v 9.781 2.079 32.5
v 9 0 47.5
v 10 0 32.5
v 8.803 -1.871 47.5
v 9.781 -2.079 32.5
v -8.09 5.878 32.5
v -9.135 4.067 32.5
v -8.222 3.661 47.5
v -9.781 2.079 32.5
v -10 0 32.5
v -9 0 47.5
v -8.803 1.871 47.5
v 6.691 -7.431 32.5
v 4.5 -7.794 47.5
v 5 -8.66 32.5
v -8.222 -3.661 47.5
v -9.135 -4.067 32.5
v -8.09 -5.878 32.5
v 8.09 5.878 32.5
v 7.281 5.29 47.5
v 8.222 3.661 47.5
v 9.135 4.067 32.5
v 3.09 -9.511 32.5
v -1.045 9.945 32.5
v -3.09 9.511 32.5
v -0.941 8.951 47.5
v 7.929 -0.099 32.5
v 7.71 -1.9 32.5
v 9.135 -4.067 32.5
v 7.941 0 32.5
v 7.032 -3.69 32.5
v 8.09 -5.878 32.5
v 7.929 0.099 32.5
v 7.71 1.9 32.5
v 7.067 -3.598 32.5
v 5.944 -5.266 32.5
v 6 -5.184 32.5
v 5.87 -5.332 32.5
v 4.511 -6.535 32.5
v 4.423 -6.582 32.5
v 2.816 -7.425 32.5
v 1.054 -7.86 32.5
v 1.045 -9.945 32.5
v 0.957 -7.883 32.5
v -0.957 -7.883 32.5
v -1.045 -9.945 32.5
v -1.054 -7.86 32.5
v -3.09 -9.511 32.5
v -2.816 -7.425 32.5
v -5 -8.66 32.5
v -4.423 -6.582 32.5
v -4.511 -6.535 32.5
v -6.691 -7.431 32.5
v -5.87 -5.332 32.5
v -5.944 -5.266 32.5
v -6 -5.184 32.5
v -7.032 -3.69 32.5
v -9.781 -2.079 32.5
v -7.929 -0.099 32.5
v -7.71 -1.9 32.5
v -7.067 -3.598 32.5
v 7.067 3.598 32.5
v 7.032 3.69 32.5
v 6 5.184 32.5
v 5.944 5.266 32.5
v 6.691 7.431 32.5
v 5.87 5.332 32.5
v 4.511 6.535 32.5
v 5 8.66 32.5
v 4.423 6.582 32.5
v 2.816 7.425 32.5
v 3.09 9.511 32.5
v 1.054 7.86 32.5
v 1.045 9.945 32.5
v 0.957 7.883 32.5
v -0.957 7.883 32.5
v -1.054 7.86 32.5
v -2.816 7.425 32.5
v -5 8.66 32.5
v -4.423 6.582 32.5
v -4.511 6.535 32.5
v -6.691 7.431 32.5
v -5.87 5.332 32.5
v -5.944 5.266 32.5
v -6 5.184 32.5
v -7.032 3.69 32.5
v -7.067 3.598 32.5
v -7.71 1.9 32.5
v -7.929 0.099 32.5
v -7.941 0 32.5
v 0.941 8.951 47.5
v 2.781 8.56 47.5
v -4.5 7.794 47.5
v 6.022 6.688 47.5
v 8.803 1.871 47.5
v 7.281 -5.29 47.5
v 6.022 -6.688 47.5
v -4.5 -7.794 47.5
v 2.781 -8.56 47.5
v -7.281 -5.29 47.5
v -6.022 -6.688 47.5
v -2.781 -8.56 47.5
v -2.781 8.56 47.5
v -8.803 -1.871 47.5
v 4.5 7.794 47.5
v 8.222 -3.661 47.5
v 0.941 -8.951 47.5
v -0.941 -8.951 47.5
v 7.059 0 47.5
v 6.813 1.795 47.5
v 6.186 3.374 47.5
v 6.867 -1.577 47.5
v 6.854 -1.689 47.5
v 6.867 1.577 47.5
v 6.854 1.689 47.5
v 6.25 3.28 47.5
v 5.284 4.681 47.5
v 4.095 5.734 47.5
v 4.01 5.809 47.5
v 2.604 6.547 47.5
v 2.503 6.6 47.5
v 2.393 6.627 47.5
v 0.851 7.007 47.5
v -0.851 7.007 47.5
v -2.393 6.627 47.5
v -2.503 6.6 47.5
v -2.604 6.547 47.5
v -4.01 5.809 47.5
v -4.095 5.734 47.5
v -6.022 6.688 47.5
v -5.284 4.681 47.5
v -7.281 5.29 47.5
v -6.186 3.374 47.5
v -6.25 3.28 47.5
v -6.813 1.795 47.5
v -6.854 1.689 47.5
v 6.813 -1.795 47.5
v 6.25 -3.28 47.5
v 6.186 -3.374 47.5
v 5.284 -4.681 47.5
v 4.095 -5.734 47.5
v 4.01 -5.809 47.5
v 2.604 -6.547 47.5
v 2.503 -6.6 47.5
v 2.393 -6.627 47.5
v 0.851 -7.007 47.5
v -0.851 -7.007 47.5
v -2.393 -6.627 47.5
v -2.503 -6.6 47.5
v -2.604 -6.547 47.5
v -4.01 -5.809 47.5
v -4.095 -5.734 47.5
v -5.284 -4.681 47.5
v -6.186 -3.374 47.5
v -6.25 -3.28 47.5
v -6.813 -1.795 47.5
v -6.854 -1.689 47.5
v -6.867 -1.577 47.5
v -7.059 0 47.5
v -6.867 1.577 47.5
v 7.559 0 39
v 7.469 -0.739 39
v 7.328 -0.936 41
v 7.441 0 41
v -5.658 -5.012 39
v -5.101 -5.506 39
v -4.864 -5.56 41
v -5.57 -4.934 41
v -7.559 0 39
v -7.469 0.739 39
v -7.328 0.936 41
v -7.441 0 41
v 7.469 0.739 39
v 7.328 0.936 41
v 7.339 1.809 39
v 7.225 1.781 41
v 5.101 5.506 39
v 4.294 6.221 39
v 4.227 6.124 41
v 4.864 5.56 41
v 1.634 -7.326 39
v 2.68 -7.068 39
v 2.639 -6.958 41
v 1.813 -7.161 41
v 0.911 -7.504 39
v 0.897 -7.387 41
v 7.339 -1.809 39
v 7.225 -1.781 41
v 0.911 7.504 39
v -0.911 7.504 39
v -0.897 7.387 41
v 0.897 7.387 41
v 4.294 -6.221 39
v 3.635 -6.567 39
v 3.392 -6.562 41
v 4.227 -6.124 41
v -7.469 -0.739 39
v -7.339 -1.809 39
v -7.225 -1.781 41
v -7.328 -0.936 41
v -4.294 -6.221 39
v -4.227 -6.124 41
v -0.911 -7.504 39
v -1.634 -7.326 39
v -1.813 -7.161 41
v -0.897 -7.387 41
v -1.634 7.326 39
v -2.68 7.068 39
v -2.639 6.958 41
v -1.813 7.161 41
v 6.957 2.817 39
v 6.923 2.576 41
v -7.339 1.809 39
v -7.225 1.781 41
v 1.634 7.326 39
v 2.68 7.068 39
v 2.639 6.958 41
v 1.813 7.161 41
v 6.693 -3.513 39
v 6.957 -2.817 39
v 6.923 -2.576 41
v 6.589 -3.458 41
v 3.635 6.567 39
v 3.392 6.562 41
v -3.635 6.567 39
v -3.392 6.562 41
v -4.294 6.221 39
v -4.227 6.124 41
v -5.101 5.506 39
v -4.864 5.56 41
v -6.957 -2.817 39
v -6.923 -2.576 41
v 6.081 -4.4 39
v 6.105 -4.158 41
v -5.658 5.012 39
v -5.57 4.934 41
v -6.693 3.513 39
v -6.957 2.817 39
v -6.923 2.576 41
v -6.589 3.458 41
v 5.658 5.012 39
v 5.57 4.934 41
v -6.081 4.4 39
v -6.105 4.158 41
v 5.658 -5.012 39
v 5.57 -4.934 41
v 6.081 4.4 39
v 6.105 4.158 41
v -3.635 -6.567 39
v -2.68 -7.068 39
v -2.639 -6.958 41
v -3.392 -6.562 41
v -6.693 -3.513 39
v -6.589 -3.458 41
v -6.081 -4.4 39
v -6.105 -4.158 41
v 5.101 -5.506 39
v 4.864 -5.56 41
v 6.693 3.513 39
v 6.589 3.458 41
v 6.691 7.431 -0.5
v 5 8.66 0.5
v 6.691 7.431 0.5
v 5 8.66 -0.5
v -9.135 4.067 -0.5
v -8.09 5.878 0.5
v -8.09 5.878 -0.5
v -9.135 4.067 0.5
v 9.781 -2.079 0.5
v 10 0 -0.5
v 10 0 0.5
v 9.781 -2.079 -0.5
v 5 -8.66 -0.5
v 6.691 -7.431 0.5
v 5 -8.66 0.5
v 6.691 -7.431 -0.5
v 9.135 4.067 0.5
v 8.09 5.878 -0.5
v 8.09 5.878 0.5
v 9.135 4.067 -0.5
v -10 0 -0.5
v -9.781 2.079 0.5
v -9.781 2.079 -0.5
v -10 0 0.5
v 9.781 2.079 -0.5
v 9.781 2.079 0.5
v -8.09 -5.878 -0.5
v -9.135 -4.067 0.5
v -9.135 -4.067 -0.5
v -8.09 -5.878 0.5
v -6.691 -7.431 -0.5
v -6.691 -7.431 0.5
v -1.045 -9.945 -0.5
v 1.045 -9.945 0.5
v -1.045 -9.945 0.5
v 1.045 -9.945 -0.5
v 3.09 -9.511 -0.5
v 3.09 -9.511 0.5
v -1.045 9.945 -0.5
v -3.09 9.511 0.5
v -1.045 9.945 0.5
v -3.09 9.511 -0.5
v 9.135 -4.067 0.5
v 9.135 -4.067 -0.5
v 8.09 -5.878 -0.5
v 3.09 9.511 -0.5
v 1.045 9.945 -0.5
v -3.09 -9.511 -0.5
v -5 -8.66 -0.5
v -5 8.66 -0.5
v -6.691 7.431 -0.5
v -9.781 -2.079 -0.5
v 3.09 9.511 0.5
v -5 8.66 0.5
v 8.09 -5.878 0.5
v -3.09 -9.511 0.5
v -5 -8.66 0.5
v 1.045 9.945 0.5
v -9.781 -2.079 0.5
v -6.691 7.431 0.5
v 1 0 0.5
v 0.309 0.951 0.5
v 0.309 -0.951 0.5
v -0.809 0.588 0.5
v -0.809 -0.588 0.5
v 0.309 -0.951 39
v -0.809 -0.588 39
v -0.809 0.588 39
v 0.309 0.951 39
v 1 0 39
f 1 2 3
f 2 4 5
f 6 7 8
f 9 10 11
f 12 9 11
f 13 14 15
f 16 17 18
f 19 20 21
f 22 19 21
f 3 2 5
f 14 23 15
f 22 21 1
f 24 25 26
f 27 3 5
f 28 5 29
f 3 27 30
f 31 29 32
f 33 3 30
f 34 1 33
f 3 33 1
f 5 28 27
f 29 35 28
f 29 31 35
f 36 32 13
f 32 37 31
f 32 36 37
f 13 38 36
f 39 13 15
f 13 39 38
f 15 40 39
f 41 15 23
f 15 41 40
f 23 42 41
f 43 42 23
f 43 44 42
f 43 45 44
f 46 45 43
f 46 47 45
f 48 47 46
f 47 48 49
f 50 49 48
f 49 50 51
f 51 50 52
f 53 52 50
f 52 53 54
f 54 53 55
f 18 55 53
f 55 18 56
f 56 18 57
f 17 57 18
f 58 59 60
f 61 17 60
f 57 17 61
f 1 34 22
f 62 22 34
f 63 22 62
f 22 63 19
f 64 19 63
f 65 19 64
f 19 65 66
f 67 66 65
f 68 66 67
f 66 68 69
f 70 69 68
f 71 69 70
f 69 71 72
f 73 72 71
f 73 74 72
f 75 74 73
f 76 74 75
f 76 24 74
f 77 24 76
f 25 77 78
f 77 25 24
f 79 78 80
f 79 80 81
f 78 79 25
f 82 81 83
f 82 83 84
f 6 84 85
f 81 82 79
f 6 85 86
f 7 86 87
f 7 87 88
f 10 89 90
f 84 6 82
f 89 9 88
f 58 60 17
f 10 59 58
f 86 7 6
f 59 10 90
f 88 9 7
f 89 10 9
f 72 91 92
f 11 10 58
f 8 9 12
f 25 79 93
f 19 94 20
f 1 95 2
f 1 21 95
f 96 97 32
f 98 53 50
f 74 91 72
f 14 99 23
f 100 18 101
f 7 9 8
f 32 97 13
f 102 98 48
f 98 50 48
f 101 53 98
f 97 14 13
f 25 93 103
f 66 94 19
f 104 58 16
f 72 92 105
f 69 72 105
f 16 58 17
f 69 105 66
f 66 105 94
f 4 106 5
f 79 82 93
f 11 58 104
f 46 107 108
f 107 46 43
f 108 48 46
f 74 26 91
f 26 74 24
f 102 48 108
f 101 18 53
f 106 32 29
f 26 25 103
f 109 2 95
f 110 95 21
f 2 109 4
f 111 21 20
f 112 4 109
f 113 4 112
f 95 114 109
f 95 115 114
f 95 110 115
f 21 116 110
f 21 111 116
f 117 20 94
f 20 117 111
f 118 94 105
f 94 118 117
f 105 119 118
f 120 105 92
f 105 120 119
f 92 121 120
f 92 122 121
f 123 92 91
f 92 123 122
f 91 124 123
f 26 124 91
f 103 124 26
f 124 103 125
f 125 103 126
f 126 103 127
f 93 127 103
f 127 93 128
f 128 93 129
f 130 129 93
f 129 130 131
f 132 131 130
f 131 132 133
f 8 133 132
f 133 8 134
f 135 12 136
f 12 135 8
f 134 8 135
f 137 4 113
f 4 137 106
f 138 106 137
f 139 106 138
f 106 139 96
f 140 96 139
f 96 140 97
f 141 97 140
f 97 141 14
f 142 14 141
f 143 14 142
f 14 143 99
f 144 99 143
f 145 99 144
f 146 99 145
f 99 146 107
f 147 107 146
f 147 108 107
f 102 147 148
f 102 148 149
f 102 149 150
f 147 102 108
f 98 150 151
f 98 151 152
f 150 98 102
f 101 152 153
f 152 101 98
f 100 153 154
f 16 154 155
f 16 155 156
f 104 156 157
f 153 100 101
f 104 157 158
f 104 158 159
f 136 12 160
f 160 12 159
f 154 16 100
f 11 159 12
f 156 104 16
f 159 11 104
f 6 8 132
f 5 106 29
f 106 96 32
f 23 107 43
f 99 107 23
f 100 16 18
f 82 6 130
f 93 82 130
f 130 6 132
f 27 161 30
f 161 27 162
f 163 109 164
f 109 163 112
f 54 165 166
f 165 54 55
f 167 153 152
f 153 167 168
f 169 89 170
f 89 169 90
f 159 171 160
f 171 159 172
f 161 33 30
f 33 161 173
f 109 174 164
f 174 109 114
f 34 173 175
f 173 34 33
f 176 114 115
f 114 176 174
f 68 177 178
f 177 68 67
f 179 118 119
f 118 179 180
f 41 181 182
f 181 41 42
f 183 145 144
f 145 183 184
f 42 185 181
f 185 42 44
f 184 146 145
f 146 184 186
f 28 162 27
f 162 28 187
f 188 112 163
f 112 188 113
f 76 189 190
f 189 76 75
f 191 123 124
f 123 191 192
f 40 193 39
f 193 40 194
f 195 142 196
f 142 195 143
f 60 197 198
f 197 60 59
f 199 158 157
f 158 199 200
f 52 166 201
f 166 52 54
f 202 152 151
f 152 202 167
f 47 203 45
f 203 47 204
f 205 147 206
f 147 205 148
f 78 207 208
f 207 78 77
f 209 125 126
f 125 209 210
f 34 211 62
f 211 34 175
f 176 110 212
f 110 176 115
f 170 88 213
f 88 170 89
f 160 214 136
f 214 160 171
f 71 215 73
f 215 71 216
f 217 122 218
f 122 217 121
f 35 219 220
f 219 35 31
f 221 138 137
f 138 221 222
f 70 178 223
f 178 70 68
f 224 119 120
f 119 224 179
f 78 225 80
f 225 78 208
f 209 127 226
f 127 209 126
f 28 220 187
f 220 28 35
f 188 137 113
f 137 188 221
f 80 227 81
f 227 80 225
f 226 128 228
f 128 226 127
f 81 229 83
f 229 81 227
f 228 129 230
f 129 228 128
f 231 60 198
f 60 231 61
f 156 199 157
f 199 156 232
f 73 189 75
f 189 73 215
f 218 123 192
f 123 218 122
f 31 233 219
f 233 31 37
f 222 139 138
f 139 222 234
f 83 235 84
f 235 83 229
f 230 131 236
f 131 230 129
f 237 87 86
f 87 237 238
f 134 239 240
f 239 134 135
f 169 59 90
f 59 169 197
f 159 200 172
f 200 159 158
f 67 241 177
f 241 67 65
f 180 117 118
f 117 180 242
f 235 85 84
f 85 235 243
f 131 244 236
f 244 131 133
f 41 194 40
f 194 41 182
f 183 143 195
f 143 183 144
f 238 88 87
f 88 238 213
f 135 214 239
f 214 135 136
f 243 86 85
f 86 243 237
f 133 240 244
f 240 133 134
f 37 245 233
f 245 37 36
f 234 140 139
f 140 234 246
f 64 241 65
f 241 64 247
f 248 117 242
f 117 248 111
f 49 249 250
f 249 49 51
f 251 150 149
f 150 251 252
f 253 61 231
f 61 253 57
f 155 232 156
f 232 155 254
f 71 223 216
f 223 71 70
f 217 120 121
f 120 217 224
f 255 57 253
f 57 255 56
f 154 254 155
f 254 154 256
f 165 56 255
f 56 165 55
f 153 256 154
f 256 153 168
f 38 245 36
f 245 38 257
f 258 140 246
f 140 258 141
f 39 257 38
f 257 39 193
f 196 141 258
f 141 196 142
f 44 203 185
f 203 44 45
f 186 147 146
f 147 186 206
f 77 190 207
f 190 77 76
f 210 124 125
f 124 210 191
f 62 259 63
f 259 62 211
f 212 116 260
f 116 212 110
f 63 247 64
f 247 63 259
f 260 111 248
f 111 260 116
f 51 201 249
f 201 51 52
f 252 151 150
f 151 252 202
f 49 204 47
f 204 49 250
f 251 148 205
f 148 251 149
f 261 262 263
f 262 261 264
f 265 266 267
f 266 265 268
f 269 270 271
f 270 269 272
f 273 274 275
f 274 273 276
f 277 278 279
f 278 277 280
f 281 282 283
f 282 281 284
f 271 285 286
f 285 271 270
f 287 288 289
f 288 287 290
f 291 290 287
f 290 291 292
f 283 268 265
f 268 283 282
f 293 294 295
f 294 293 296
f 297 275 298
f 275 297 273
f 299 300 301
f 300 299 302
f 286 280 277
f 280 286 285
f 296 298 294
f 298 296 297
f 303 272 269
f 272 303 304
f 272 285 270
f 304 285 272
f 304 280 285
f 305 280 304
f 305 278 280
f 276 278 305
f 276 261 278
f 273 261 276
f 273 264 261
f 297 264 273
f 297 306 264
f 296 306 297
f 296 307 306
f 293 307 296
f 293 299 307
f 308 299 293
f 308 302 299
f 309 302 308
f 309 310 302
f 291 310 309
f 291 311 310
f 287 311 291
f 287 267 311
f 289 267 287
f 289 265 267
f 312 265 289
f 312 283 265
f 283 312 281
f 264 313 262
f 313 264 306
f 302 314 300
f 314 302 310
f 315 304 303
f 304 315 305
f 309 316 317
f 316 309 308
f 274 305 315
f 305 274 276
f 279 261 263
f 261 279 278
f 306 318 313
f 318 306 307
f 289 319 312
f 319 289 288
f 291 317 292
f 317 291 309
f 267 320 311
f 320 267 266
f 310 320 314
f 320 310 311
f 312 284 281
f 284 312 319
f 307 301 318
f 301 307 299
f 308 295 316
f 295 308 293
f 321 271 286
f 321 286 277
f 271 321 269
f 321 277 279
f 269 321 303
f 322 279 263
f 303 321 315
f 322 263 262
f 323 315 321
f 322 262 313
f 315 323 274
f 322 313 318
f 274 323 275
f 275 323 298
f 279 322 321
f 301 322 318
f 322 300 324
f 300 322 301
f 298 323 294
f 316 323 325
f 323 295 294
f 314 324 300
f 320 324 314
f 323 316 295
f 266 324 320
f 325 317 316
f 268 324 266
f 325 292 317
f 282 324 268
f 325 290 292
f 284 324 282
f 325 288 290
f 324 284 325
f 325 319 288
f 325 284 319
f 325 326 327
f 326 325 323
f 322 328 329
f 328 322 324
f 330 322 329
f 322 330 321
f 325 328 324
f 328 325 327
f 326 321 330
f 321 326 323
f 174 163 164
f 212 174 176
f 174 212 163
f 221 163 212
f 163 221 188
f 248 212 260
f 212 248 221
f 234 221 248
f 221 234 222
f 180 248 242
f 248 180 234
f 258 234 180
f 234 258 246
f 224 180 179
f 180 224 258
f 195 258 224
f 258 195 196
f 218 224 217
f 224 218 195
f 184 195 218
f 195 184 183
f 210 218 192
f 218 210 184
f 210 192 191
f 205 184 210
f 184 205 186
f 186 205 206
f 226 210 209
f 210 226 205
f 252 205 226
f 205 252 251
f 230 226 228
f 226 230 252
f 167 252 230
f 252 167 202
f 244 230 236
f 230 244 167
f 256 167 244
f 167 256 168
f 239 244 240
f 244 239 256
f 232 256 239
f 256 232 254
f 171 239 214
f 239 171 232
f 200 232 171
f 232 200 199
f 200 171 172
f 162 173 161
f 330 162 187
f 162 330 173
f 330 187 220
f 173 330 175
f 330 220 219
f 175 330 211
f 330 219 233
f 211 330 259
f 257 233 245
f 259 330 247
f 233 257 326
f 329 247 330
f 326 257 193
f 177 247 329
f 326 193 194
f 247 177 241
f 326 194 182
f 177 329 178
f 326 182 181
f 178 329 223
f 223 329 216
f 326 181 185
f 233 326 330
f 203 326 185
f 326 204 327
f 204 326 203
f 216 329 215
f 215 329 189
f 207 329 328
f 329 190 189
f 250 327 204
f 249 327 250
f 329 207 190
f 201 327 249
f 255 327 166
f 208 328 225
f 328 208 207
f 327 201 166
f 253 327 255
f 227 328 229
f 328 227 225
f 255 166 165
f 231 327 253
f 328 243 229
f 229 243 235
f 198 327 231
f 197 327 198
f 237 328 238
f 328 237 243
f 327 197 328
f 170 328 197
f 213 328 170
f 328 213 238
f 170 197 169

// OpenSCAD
module Lamp_01(){

    color("#c1cdcd")
    cylinder(1,10,10, center= true);

    color("#c1cdcd")
    translate([0,0,20])
    cylinder(40,1,1, center= true);

    color("#ce5a57")
    translate([0,0,40])
    cylinder(2,8,8, center= true);

    difference(){
    color("#e47025")
    translate([0,0,40])
    cylinder(15,10,9, center= true);

    color("#e47025")
    translate([0,0,40])
    cylinder(17,8,7, center= true);

    }

}

Lamp_01();


// Written by Nicolì Angelo (Gengio) 2024: 
// MIT License

//Permission is hereby granted, free of charge, to any person obtaining a copy of this software and associated documentation files (the "Software"), to deal in the Software without restriction, including without limitation the rights to use, copy, modify, merge, publish, distribute, sublicense, and/or sell copies of the Software, and to permit persons to whom the Software is furnished to do so, subject to the following conditions:

//The above copyright notice and this permission notice shall be included in all copies or substantial portions of the Software.

//THE SOFTWARE IS PROVIDED "AS IS", WITHOUT WARRANTY OF ANY KIND, EXPRESS OR IMPLIED, INCLUDING BUT NOT LIMITED TO THE WARRANTIES OF MERCHANTABILITY, FITNESS FOR A PARTICULAR PURPOSE AND NONINFRINGEMENT. IN NO EVENT SHALL THE AUTHORS OR COPYRIGHT HOLDERS BE LIABLE FOR ANY CLAIM, DAMAGES OR OTHER LIABILITY, WHETHER IN AN ACTION OF CONTRACT, TORT OR OTHERWISE, ARISING FROM, OUT OF OR IN CONNECTION WITH THE SOFTWARE OR THE USE OR OTHER DEALINGS IN THE SOFTWARE.
